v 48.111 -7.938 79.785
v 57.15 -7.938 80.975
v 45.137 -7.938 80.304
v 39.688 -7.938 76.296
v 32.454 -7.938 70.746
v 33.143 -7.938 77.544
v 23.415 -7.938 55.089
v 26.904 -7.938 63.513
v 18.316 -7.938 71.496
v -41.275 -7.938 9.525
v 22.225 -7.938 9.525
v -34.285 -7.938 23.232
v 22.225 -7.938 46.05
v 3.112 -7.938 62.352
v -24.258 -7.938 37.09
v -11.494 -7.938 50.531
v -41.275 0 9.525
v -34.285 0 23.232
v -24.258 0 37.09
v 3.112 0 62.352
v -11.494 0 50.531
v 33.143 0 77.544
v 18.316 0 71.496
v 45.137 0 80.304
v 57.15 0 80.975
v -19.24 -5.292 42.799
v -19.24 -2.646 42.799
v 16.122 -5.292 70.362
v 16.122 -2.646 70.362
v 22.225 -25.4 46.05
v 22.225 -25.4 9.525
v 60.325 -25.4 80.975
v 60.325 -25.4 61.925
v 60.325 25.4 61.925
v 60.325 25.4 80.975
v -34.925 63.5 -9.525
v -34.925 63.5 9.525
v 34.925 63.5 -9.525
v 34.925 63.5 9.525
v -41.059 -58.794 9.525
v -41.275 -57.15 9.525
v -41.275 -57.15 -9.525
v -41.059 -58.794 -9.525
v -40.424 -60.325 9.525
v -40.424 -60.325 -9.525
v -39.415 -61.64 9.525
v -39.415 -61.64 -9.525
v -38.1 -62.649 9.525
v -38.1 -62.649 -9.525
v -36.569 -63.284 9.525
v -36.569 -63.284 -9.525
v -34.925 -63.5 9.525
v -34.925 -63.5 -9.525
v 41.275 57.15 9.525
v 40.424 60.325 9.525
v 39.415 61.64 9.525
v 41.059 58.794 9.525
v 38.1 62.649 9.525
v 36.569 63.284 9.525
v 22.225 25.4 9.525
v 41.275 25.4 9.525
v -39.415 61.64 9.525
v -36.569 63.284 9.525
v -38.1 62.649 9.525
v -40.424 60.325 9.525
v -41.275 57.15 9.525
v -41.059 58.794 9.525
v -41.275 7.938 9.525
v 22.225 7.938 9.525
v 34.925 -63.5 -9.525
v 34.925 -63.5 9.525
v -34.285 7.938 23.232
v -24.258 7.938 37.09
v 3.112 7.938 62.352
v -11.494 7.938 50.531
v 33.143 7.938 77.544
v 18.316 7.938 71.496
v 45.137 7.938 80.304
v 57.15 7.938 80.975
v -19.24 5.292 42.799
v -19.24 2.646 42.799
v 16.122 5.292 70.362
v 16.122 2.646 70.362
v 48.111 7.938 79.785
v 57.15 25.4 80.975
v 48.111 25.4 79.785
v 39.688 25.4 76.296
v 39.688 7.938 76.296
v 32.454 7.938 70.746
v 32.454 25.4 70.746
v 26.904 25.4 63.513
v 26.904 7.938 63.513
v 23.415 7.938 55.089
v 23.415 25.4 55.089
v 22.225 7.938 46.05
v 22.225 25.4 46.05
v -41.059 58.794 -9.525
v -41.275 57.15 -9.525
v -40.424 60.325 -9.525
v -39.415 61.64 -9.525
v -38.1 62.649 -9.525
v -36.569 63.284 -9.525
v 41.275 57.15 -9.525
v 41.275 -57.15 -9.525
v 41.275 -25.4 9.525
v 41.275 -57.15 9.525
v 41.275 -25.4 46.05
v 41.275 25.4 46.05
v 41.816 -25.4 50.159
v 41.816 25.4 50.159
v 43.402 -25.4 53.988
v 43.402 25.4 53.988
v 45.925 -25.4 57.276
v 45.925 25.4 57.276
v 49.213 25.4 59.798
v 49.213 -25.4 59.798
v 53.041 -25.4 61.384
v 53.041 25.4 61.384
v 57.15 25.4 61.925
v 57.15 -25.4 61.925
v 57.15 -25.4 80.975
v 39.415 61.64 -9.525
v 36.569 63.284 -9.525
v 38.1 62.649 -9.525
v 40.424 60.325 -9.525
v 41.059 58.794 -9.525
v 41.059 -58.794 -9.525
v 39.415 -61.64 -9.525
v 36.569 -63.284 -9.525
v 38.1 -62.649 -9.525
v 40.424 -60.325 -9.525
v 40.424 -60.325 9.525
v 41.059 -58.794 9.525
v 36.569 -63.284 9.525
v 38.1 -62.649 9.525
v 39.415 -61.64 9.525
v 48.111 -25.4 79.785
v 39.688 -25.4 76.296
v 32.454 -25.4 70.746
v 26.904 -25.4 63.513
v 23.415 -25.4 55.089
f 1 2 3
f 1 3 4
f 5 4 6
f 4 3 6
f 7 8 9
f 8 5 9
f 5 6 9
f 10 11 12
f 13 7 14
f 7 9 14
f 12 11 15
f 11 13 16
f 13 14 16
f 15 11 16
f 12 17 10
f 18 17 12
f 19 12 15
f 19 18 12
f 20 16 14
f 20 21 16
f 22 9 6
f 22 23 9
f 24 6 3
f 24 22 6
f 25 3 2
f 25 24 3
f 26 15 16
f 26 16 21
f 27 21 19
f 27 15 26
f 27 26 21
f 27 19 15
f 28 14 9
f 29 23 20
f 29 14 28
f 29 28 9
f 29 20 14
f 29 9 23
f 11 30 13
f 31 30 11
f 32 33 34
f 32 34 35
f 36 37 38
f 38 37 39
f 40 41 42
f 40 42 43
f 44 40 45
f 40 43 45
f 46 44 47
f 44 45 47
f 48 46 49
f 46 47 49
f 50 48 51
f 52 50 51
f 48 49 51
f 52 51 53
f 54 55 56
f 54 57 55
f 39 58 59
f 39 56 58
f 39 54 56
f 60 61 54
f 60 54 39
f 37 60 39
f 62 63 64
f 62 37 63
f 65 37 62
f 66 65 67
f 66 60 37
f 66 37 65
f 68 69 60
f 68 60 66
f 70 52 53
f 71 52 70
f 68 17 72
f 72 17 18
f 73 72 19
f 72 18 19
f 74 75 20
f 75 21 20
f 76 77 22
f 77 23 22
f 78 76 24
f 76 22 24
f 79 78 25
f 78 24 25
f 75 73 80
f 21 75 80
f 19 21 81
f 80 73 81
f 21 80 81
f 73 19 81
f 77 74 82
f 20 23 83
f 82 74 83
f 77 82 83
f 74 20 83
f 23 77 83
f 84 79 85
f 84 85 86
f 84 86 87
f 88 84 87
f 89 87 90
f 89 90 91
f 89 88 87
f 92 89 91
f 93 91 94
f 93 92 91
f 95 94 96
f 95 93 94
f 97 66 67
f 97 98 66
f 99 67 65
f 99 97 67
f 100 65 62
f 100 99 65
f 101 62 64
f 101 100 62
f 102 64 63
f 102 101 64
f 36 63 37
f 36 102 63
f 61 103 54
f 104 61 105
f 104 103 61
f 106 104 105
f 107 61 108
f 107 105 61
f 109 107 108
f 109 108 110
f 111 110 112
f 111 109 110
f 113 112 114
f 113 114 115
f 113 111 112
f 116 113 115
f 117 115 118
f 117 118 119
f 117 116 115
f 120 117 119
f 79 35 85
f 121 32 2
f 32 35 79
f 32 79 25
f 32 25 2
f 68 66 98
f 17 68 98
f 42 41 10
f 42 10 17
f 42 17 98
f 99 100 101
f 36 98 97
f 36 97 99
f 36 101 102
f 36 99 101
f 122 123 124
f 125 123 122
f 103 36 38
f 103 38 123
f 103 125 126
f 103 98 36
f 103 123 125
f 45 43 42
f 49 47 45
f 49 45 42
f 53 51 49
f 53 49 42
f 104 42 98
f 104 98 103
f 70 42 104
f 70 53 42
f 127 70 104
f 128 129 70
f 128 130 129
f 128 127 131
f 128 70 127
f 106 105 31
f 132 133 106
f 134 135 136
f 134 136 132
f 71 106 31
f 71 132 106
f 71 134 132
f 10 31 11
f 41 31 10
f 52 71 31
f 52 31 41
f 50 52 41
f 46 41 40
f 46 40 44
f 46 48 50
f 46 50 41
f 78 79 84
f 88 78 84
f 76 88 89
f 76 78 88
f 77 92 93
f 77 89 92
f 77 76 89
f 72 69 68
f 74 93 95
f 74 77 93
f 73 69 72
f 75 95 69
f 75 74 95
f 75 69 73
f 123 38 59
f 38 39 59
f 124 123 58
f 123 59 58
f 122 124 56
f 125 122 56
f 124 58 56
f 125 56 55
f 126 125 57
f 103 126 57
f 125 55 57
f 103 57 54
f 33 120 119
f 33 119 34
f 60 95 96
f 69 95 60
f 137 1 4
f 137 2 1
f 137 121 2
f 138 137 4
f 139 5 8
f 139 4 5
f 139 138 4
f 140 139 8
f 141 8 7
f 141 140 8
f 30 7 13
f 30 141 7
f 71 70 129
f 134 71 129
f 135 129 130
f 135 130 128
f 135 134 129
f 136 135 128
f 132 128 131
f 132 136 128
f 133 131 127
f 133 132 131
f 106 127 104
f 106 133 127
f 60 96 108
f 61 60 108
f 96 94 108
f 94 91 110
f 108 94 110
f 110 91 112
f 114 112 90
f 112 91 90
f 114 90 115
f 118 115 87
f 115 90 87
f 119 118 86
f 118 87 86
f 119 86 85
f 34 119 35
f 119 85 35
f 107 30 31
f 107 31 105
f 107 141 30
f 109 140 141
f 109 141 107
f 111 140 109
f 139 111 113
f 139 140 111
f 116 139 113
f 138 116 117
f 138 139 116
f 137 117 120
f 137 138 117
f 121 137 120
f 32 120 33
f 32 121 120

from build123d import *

# Parameters (mm, degrees)
F1_DEPTH = 63.5
F2_DEPTH = 25.4
F3_DEPTH = 7.9375
F5_R     = 6.35


# Not quite as in the source:
# - the program builds the solid bodies; features that only make, move or delete a surface that nothing else refers to are left out


with BuildPart() as f1:
    # F0 (on Front) → F1 (new body, symmetric)
    with BuildSketch(Plane.XZ):
        Polygon((22.225, 9.525), (-41.275, 9.525), (-41.275, -9.525), (41.275, -9.525), (41.275, 9.525), align=None)
    extrude(amount=F1_DEPTH, both=True)

    # F0 (on Front) → F2 (join, symmetric)
    with BuildSketch(Plane.XZ):
        with BuildLine():
            Line((22.225, 46.0502), (22.225, 9.525))
            Line((22.225, 9.525), (41.275, 9.525))
            Line((41.275, 9.525), (41.275, 46.0502))
            ThreePointArc((41.275, 46.0502), (45.9246798487, 57.2755201513), (57.15, 61.9252))
            Line((57.15, 61.9252), (60.325, 61.9252))
            Line((60.325, 61.9252), (60.325, 80.9752))
            Line((60.325, 80.9752), (57.15, 80.9752))
            ThreePointArc((57.15, 80.9752), (32.4542956671, 70.7459043329), (22.225, 46.0502))
        make_face()
    extrude(amount=F2_DEPTH, both=True)

    # F0 (on Front) → F3 (join, symmetric)
    with BuildSketch(Plane.XZ):
        with BuildLine():
            add(Edge.make_bspline(
                [(-41.275, 9.525), (-28.4558665007, 41.9093370438), (15.8414896578, 82.5819298625), (57.15, 80.9752)],
                knots=[0, 0, 0, 0, 121.6248811101, 121.6248811101, 121.6248811101, 121.6248811101], degree=3))
            Line((-41.275, 9.525), (22.225, 9.525))
            Line((22.225, 9.525), (22.225, 46.0502))
            ThreePointArc((22.225, 46.0502), (32.4542956671, 70.7459043329), (57.15, 80.9752))
        make_face()
    extrude(amount=F3_DEPTH, both=True)

    # F5
    f5_edges = [f1.edges().sort_by_distance(p)[0] for p in [
        (-41.275, -63.5, 0),
        (41.275, -63.5, 0),
        (41.275, 63.5, 0),
        (-41.275, 63.5, 0),
    ]]
    fillet(f5_edges, radius=F5_R)


solid = f1.part
